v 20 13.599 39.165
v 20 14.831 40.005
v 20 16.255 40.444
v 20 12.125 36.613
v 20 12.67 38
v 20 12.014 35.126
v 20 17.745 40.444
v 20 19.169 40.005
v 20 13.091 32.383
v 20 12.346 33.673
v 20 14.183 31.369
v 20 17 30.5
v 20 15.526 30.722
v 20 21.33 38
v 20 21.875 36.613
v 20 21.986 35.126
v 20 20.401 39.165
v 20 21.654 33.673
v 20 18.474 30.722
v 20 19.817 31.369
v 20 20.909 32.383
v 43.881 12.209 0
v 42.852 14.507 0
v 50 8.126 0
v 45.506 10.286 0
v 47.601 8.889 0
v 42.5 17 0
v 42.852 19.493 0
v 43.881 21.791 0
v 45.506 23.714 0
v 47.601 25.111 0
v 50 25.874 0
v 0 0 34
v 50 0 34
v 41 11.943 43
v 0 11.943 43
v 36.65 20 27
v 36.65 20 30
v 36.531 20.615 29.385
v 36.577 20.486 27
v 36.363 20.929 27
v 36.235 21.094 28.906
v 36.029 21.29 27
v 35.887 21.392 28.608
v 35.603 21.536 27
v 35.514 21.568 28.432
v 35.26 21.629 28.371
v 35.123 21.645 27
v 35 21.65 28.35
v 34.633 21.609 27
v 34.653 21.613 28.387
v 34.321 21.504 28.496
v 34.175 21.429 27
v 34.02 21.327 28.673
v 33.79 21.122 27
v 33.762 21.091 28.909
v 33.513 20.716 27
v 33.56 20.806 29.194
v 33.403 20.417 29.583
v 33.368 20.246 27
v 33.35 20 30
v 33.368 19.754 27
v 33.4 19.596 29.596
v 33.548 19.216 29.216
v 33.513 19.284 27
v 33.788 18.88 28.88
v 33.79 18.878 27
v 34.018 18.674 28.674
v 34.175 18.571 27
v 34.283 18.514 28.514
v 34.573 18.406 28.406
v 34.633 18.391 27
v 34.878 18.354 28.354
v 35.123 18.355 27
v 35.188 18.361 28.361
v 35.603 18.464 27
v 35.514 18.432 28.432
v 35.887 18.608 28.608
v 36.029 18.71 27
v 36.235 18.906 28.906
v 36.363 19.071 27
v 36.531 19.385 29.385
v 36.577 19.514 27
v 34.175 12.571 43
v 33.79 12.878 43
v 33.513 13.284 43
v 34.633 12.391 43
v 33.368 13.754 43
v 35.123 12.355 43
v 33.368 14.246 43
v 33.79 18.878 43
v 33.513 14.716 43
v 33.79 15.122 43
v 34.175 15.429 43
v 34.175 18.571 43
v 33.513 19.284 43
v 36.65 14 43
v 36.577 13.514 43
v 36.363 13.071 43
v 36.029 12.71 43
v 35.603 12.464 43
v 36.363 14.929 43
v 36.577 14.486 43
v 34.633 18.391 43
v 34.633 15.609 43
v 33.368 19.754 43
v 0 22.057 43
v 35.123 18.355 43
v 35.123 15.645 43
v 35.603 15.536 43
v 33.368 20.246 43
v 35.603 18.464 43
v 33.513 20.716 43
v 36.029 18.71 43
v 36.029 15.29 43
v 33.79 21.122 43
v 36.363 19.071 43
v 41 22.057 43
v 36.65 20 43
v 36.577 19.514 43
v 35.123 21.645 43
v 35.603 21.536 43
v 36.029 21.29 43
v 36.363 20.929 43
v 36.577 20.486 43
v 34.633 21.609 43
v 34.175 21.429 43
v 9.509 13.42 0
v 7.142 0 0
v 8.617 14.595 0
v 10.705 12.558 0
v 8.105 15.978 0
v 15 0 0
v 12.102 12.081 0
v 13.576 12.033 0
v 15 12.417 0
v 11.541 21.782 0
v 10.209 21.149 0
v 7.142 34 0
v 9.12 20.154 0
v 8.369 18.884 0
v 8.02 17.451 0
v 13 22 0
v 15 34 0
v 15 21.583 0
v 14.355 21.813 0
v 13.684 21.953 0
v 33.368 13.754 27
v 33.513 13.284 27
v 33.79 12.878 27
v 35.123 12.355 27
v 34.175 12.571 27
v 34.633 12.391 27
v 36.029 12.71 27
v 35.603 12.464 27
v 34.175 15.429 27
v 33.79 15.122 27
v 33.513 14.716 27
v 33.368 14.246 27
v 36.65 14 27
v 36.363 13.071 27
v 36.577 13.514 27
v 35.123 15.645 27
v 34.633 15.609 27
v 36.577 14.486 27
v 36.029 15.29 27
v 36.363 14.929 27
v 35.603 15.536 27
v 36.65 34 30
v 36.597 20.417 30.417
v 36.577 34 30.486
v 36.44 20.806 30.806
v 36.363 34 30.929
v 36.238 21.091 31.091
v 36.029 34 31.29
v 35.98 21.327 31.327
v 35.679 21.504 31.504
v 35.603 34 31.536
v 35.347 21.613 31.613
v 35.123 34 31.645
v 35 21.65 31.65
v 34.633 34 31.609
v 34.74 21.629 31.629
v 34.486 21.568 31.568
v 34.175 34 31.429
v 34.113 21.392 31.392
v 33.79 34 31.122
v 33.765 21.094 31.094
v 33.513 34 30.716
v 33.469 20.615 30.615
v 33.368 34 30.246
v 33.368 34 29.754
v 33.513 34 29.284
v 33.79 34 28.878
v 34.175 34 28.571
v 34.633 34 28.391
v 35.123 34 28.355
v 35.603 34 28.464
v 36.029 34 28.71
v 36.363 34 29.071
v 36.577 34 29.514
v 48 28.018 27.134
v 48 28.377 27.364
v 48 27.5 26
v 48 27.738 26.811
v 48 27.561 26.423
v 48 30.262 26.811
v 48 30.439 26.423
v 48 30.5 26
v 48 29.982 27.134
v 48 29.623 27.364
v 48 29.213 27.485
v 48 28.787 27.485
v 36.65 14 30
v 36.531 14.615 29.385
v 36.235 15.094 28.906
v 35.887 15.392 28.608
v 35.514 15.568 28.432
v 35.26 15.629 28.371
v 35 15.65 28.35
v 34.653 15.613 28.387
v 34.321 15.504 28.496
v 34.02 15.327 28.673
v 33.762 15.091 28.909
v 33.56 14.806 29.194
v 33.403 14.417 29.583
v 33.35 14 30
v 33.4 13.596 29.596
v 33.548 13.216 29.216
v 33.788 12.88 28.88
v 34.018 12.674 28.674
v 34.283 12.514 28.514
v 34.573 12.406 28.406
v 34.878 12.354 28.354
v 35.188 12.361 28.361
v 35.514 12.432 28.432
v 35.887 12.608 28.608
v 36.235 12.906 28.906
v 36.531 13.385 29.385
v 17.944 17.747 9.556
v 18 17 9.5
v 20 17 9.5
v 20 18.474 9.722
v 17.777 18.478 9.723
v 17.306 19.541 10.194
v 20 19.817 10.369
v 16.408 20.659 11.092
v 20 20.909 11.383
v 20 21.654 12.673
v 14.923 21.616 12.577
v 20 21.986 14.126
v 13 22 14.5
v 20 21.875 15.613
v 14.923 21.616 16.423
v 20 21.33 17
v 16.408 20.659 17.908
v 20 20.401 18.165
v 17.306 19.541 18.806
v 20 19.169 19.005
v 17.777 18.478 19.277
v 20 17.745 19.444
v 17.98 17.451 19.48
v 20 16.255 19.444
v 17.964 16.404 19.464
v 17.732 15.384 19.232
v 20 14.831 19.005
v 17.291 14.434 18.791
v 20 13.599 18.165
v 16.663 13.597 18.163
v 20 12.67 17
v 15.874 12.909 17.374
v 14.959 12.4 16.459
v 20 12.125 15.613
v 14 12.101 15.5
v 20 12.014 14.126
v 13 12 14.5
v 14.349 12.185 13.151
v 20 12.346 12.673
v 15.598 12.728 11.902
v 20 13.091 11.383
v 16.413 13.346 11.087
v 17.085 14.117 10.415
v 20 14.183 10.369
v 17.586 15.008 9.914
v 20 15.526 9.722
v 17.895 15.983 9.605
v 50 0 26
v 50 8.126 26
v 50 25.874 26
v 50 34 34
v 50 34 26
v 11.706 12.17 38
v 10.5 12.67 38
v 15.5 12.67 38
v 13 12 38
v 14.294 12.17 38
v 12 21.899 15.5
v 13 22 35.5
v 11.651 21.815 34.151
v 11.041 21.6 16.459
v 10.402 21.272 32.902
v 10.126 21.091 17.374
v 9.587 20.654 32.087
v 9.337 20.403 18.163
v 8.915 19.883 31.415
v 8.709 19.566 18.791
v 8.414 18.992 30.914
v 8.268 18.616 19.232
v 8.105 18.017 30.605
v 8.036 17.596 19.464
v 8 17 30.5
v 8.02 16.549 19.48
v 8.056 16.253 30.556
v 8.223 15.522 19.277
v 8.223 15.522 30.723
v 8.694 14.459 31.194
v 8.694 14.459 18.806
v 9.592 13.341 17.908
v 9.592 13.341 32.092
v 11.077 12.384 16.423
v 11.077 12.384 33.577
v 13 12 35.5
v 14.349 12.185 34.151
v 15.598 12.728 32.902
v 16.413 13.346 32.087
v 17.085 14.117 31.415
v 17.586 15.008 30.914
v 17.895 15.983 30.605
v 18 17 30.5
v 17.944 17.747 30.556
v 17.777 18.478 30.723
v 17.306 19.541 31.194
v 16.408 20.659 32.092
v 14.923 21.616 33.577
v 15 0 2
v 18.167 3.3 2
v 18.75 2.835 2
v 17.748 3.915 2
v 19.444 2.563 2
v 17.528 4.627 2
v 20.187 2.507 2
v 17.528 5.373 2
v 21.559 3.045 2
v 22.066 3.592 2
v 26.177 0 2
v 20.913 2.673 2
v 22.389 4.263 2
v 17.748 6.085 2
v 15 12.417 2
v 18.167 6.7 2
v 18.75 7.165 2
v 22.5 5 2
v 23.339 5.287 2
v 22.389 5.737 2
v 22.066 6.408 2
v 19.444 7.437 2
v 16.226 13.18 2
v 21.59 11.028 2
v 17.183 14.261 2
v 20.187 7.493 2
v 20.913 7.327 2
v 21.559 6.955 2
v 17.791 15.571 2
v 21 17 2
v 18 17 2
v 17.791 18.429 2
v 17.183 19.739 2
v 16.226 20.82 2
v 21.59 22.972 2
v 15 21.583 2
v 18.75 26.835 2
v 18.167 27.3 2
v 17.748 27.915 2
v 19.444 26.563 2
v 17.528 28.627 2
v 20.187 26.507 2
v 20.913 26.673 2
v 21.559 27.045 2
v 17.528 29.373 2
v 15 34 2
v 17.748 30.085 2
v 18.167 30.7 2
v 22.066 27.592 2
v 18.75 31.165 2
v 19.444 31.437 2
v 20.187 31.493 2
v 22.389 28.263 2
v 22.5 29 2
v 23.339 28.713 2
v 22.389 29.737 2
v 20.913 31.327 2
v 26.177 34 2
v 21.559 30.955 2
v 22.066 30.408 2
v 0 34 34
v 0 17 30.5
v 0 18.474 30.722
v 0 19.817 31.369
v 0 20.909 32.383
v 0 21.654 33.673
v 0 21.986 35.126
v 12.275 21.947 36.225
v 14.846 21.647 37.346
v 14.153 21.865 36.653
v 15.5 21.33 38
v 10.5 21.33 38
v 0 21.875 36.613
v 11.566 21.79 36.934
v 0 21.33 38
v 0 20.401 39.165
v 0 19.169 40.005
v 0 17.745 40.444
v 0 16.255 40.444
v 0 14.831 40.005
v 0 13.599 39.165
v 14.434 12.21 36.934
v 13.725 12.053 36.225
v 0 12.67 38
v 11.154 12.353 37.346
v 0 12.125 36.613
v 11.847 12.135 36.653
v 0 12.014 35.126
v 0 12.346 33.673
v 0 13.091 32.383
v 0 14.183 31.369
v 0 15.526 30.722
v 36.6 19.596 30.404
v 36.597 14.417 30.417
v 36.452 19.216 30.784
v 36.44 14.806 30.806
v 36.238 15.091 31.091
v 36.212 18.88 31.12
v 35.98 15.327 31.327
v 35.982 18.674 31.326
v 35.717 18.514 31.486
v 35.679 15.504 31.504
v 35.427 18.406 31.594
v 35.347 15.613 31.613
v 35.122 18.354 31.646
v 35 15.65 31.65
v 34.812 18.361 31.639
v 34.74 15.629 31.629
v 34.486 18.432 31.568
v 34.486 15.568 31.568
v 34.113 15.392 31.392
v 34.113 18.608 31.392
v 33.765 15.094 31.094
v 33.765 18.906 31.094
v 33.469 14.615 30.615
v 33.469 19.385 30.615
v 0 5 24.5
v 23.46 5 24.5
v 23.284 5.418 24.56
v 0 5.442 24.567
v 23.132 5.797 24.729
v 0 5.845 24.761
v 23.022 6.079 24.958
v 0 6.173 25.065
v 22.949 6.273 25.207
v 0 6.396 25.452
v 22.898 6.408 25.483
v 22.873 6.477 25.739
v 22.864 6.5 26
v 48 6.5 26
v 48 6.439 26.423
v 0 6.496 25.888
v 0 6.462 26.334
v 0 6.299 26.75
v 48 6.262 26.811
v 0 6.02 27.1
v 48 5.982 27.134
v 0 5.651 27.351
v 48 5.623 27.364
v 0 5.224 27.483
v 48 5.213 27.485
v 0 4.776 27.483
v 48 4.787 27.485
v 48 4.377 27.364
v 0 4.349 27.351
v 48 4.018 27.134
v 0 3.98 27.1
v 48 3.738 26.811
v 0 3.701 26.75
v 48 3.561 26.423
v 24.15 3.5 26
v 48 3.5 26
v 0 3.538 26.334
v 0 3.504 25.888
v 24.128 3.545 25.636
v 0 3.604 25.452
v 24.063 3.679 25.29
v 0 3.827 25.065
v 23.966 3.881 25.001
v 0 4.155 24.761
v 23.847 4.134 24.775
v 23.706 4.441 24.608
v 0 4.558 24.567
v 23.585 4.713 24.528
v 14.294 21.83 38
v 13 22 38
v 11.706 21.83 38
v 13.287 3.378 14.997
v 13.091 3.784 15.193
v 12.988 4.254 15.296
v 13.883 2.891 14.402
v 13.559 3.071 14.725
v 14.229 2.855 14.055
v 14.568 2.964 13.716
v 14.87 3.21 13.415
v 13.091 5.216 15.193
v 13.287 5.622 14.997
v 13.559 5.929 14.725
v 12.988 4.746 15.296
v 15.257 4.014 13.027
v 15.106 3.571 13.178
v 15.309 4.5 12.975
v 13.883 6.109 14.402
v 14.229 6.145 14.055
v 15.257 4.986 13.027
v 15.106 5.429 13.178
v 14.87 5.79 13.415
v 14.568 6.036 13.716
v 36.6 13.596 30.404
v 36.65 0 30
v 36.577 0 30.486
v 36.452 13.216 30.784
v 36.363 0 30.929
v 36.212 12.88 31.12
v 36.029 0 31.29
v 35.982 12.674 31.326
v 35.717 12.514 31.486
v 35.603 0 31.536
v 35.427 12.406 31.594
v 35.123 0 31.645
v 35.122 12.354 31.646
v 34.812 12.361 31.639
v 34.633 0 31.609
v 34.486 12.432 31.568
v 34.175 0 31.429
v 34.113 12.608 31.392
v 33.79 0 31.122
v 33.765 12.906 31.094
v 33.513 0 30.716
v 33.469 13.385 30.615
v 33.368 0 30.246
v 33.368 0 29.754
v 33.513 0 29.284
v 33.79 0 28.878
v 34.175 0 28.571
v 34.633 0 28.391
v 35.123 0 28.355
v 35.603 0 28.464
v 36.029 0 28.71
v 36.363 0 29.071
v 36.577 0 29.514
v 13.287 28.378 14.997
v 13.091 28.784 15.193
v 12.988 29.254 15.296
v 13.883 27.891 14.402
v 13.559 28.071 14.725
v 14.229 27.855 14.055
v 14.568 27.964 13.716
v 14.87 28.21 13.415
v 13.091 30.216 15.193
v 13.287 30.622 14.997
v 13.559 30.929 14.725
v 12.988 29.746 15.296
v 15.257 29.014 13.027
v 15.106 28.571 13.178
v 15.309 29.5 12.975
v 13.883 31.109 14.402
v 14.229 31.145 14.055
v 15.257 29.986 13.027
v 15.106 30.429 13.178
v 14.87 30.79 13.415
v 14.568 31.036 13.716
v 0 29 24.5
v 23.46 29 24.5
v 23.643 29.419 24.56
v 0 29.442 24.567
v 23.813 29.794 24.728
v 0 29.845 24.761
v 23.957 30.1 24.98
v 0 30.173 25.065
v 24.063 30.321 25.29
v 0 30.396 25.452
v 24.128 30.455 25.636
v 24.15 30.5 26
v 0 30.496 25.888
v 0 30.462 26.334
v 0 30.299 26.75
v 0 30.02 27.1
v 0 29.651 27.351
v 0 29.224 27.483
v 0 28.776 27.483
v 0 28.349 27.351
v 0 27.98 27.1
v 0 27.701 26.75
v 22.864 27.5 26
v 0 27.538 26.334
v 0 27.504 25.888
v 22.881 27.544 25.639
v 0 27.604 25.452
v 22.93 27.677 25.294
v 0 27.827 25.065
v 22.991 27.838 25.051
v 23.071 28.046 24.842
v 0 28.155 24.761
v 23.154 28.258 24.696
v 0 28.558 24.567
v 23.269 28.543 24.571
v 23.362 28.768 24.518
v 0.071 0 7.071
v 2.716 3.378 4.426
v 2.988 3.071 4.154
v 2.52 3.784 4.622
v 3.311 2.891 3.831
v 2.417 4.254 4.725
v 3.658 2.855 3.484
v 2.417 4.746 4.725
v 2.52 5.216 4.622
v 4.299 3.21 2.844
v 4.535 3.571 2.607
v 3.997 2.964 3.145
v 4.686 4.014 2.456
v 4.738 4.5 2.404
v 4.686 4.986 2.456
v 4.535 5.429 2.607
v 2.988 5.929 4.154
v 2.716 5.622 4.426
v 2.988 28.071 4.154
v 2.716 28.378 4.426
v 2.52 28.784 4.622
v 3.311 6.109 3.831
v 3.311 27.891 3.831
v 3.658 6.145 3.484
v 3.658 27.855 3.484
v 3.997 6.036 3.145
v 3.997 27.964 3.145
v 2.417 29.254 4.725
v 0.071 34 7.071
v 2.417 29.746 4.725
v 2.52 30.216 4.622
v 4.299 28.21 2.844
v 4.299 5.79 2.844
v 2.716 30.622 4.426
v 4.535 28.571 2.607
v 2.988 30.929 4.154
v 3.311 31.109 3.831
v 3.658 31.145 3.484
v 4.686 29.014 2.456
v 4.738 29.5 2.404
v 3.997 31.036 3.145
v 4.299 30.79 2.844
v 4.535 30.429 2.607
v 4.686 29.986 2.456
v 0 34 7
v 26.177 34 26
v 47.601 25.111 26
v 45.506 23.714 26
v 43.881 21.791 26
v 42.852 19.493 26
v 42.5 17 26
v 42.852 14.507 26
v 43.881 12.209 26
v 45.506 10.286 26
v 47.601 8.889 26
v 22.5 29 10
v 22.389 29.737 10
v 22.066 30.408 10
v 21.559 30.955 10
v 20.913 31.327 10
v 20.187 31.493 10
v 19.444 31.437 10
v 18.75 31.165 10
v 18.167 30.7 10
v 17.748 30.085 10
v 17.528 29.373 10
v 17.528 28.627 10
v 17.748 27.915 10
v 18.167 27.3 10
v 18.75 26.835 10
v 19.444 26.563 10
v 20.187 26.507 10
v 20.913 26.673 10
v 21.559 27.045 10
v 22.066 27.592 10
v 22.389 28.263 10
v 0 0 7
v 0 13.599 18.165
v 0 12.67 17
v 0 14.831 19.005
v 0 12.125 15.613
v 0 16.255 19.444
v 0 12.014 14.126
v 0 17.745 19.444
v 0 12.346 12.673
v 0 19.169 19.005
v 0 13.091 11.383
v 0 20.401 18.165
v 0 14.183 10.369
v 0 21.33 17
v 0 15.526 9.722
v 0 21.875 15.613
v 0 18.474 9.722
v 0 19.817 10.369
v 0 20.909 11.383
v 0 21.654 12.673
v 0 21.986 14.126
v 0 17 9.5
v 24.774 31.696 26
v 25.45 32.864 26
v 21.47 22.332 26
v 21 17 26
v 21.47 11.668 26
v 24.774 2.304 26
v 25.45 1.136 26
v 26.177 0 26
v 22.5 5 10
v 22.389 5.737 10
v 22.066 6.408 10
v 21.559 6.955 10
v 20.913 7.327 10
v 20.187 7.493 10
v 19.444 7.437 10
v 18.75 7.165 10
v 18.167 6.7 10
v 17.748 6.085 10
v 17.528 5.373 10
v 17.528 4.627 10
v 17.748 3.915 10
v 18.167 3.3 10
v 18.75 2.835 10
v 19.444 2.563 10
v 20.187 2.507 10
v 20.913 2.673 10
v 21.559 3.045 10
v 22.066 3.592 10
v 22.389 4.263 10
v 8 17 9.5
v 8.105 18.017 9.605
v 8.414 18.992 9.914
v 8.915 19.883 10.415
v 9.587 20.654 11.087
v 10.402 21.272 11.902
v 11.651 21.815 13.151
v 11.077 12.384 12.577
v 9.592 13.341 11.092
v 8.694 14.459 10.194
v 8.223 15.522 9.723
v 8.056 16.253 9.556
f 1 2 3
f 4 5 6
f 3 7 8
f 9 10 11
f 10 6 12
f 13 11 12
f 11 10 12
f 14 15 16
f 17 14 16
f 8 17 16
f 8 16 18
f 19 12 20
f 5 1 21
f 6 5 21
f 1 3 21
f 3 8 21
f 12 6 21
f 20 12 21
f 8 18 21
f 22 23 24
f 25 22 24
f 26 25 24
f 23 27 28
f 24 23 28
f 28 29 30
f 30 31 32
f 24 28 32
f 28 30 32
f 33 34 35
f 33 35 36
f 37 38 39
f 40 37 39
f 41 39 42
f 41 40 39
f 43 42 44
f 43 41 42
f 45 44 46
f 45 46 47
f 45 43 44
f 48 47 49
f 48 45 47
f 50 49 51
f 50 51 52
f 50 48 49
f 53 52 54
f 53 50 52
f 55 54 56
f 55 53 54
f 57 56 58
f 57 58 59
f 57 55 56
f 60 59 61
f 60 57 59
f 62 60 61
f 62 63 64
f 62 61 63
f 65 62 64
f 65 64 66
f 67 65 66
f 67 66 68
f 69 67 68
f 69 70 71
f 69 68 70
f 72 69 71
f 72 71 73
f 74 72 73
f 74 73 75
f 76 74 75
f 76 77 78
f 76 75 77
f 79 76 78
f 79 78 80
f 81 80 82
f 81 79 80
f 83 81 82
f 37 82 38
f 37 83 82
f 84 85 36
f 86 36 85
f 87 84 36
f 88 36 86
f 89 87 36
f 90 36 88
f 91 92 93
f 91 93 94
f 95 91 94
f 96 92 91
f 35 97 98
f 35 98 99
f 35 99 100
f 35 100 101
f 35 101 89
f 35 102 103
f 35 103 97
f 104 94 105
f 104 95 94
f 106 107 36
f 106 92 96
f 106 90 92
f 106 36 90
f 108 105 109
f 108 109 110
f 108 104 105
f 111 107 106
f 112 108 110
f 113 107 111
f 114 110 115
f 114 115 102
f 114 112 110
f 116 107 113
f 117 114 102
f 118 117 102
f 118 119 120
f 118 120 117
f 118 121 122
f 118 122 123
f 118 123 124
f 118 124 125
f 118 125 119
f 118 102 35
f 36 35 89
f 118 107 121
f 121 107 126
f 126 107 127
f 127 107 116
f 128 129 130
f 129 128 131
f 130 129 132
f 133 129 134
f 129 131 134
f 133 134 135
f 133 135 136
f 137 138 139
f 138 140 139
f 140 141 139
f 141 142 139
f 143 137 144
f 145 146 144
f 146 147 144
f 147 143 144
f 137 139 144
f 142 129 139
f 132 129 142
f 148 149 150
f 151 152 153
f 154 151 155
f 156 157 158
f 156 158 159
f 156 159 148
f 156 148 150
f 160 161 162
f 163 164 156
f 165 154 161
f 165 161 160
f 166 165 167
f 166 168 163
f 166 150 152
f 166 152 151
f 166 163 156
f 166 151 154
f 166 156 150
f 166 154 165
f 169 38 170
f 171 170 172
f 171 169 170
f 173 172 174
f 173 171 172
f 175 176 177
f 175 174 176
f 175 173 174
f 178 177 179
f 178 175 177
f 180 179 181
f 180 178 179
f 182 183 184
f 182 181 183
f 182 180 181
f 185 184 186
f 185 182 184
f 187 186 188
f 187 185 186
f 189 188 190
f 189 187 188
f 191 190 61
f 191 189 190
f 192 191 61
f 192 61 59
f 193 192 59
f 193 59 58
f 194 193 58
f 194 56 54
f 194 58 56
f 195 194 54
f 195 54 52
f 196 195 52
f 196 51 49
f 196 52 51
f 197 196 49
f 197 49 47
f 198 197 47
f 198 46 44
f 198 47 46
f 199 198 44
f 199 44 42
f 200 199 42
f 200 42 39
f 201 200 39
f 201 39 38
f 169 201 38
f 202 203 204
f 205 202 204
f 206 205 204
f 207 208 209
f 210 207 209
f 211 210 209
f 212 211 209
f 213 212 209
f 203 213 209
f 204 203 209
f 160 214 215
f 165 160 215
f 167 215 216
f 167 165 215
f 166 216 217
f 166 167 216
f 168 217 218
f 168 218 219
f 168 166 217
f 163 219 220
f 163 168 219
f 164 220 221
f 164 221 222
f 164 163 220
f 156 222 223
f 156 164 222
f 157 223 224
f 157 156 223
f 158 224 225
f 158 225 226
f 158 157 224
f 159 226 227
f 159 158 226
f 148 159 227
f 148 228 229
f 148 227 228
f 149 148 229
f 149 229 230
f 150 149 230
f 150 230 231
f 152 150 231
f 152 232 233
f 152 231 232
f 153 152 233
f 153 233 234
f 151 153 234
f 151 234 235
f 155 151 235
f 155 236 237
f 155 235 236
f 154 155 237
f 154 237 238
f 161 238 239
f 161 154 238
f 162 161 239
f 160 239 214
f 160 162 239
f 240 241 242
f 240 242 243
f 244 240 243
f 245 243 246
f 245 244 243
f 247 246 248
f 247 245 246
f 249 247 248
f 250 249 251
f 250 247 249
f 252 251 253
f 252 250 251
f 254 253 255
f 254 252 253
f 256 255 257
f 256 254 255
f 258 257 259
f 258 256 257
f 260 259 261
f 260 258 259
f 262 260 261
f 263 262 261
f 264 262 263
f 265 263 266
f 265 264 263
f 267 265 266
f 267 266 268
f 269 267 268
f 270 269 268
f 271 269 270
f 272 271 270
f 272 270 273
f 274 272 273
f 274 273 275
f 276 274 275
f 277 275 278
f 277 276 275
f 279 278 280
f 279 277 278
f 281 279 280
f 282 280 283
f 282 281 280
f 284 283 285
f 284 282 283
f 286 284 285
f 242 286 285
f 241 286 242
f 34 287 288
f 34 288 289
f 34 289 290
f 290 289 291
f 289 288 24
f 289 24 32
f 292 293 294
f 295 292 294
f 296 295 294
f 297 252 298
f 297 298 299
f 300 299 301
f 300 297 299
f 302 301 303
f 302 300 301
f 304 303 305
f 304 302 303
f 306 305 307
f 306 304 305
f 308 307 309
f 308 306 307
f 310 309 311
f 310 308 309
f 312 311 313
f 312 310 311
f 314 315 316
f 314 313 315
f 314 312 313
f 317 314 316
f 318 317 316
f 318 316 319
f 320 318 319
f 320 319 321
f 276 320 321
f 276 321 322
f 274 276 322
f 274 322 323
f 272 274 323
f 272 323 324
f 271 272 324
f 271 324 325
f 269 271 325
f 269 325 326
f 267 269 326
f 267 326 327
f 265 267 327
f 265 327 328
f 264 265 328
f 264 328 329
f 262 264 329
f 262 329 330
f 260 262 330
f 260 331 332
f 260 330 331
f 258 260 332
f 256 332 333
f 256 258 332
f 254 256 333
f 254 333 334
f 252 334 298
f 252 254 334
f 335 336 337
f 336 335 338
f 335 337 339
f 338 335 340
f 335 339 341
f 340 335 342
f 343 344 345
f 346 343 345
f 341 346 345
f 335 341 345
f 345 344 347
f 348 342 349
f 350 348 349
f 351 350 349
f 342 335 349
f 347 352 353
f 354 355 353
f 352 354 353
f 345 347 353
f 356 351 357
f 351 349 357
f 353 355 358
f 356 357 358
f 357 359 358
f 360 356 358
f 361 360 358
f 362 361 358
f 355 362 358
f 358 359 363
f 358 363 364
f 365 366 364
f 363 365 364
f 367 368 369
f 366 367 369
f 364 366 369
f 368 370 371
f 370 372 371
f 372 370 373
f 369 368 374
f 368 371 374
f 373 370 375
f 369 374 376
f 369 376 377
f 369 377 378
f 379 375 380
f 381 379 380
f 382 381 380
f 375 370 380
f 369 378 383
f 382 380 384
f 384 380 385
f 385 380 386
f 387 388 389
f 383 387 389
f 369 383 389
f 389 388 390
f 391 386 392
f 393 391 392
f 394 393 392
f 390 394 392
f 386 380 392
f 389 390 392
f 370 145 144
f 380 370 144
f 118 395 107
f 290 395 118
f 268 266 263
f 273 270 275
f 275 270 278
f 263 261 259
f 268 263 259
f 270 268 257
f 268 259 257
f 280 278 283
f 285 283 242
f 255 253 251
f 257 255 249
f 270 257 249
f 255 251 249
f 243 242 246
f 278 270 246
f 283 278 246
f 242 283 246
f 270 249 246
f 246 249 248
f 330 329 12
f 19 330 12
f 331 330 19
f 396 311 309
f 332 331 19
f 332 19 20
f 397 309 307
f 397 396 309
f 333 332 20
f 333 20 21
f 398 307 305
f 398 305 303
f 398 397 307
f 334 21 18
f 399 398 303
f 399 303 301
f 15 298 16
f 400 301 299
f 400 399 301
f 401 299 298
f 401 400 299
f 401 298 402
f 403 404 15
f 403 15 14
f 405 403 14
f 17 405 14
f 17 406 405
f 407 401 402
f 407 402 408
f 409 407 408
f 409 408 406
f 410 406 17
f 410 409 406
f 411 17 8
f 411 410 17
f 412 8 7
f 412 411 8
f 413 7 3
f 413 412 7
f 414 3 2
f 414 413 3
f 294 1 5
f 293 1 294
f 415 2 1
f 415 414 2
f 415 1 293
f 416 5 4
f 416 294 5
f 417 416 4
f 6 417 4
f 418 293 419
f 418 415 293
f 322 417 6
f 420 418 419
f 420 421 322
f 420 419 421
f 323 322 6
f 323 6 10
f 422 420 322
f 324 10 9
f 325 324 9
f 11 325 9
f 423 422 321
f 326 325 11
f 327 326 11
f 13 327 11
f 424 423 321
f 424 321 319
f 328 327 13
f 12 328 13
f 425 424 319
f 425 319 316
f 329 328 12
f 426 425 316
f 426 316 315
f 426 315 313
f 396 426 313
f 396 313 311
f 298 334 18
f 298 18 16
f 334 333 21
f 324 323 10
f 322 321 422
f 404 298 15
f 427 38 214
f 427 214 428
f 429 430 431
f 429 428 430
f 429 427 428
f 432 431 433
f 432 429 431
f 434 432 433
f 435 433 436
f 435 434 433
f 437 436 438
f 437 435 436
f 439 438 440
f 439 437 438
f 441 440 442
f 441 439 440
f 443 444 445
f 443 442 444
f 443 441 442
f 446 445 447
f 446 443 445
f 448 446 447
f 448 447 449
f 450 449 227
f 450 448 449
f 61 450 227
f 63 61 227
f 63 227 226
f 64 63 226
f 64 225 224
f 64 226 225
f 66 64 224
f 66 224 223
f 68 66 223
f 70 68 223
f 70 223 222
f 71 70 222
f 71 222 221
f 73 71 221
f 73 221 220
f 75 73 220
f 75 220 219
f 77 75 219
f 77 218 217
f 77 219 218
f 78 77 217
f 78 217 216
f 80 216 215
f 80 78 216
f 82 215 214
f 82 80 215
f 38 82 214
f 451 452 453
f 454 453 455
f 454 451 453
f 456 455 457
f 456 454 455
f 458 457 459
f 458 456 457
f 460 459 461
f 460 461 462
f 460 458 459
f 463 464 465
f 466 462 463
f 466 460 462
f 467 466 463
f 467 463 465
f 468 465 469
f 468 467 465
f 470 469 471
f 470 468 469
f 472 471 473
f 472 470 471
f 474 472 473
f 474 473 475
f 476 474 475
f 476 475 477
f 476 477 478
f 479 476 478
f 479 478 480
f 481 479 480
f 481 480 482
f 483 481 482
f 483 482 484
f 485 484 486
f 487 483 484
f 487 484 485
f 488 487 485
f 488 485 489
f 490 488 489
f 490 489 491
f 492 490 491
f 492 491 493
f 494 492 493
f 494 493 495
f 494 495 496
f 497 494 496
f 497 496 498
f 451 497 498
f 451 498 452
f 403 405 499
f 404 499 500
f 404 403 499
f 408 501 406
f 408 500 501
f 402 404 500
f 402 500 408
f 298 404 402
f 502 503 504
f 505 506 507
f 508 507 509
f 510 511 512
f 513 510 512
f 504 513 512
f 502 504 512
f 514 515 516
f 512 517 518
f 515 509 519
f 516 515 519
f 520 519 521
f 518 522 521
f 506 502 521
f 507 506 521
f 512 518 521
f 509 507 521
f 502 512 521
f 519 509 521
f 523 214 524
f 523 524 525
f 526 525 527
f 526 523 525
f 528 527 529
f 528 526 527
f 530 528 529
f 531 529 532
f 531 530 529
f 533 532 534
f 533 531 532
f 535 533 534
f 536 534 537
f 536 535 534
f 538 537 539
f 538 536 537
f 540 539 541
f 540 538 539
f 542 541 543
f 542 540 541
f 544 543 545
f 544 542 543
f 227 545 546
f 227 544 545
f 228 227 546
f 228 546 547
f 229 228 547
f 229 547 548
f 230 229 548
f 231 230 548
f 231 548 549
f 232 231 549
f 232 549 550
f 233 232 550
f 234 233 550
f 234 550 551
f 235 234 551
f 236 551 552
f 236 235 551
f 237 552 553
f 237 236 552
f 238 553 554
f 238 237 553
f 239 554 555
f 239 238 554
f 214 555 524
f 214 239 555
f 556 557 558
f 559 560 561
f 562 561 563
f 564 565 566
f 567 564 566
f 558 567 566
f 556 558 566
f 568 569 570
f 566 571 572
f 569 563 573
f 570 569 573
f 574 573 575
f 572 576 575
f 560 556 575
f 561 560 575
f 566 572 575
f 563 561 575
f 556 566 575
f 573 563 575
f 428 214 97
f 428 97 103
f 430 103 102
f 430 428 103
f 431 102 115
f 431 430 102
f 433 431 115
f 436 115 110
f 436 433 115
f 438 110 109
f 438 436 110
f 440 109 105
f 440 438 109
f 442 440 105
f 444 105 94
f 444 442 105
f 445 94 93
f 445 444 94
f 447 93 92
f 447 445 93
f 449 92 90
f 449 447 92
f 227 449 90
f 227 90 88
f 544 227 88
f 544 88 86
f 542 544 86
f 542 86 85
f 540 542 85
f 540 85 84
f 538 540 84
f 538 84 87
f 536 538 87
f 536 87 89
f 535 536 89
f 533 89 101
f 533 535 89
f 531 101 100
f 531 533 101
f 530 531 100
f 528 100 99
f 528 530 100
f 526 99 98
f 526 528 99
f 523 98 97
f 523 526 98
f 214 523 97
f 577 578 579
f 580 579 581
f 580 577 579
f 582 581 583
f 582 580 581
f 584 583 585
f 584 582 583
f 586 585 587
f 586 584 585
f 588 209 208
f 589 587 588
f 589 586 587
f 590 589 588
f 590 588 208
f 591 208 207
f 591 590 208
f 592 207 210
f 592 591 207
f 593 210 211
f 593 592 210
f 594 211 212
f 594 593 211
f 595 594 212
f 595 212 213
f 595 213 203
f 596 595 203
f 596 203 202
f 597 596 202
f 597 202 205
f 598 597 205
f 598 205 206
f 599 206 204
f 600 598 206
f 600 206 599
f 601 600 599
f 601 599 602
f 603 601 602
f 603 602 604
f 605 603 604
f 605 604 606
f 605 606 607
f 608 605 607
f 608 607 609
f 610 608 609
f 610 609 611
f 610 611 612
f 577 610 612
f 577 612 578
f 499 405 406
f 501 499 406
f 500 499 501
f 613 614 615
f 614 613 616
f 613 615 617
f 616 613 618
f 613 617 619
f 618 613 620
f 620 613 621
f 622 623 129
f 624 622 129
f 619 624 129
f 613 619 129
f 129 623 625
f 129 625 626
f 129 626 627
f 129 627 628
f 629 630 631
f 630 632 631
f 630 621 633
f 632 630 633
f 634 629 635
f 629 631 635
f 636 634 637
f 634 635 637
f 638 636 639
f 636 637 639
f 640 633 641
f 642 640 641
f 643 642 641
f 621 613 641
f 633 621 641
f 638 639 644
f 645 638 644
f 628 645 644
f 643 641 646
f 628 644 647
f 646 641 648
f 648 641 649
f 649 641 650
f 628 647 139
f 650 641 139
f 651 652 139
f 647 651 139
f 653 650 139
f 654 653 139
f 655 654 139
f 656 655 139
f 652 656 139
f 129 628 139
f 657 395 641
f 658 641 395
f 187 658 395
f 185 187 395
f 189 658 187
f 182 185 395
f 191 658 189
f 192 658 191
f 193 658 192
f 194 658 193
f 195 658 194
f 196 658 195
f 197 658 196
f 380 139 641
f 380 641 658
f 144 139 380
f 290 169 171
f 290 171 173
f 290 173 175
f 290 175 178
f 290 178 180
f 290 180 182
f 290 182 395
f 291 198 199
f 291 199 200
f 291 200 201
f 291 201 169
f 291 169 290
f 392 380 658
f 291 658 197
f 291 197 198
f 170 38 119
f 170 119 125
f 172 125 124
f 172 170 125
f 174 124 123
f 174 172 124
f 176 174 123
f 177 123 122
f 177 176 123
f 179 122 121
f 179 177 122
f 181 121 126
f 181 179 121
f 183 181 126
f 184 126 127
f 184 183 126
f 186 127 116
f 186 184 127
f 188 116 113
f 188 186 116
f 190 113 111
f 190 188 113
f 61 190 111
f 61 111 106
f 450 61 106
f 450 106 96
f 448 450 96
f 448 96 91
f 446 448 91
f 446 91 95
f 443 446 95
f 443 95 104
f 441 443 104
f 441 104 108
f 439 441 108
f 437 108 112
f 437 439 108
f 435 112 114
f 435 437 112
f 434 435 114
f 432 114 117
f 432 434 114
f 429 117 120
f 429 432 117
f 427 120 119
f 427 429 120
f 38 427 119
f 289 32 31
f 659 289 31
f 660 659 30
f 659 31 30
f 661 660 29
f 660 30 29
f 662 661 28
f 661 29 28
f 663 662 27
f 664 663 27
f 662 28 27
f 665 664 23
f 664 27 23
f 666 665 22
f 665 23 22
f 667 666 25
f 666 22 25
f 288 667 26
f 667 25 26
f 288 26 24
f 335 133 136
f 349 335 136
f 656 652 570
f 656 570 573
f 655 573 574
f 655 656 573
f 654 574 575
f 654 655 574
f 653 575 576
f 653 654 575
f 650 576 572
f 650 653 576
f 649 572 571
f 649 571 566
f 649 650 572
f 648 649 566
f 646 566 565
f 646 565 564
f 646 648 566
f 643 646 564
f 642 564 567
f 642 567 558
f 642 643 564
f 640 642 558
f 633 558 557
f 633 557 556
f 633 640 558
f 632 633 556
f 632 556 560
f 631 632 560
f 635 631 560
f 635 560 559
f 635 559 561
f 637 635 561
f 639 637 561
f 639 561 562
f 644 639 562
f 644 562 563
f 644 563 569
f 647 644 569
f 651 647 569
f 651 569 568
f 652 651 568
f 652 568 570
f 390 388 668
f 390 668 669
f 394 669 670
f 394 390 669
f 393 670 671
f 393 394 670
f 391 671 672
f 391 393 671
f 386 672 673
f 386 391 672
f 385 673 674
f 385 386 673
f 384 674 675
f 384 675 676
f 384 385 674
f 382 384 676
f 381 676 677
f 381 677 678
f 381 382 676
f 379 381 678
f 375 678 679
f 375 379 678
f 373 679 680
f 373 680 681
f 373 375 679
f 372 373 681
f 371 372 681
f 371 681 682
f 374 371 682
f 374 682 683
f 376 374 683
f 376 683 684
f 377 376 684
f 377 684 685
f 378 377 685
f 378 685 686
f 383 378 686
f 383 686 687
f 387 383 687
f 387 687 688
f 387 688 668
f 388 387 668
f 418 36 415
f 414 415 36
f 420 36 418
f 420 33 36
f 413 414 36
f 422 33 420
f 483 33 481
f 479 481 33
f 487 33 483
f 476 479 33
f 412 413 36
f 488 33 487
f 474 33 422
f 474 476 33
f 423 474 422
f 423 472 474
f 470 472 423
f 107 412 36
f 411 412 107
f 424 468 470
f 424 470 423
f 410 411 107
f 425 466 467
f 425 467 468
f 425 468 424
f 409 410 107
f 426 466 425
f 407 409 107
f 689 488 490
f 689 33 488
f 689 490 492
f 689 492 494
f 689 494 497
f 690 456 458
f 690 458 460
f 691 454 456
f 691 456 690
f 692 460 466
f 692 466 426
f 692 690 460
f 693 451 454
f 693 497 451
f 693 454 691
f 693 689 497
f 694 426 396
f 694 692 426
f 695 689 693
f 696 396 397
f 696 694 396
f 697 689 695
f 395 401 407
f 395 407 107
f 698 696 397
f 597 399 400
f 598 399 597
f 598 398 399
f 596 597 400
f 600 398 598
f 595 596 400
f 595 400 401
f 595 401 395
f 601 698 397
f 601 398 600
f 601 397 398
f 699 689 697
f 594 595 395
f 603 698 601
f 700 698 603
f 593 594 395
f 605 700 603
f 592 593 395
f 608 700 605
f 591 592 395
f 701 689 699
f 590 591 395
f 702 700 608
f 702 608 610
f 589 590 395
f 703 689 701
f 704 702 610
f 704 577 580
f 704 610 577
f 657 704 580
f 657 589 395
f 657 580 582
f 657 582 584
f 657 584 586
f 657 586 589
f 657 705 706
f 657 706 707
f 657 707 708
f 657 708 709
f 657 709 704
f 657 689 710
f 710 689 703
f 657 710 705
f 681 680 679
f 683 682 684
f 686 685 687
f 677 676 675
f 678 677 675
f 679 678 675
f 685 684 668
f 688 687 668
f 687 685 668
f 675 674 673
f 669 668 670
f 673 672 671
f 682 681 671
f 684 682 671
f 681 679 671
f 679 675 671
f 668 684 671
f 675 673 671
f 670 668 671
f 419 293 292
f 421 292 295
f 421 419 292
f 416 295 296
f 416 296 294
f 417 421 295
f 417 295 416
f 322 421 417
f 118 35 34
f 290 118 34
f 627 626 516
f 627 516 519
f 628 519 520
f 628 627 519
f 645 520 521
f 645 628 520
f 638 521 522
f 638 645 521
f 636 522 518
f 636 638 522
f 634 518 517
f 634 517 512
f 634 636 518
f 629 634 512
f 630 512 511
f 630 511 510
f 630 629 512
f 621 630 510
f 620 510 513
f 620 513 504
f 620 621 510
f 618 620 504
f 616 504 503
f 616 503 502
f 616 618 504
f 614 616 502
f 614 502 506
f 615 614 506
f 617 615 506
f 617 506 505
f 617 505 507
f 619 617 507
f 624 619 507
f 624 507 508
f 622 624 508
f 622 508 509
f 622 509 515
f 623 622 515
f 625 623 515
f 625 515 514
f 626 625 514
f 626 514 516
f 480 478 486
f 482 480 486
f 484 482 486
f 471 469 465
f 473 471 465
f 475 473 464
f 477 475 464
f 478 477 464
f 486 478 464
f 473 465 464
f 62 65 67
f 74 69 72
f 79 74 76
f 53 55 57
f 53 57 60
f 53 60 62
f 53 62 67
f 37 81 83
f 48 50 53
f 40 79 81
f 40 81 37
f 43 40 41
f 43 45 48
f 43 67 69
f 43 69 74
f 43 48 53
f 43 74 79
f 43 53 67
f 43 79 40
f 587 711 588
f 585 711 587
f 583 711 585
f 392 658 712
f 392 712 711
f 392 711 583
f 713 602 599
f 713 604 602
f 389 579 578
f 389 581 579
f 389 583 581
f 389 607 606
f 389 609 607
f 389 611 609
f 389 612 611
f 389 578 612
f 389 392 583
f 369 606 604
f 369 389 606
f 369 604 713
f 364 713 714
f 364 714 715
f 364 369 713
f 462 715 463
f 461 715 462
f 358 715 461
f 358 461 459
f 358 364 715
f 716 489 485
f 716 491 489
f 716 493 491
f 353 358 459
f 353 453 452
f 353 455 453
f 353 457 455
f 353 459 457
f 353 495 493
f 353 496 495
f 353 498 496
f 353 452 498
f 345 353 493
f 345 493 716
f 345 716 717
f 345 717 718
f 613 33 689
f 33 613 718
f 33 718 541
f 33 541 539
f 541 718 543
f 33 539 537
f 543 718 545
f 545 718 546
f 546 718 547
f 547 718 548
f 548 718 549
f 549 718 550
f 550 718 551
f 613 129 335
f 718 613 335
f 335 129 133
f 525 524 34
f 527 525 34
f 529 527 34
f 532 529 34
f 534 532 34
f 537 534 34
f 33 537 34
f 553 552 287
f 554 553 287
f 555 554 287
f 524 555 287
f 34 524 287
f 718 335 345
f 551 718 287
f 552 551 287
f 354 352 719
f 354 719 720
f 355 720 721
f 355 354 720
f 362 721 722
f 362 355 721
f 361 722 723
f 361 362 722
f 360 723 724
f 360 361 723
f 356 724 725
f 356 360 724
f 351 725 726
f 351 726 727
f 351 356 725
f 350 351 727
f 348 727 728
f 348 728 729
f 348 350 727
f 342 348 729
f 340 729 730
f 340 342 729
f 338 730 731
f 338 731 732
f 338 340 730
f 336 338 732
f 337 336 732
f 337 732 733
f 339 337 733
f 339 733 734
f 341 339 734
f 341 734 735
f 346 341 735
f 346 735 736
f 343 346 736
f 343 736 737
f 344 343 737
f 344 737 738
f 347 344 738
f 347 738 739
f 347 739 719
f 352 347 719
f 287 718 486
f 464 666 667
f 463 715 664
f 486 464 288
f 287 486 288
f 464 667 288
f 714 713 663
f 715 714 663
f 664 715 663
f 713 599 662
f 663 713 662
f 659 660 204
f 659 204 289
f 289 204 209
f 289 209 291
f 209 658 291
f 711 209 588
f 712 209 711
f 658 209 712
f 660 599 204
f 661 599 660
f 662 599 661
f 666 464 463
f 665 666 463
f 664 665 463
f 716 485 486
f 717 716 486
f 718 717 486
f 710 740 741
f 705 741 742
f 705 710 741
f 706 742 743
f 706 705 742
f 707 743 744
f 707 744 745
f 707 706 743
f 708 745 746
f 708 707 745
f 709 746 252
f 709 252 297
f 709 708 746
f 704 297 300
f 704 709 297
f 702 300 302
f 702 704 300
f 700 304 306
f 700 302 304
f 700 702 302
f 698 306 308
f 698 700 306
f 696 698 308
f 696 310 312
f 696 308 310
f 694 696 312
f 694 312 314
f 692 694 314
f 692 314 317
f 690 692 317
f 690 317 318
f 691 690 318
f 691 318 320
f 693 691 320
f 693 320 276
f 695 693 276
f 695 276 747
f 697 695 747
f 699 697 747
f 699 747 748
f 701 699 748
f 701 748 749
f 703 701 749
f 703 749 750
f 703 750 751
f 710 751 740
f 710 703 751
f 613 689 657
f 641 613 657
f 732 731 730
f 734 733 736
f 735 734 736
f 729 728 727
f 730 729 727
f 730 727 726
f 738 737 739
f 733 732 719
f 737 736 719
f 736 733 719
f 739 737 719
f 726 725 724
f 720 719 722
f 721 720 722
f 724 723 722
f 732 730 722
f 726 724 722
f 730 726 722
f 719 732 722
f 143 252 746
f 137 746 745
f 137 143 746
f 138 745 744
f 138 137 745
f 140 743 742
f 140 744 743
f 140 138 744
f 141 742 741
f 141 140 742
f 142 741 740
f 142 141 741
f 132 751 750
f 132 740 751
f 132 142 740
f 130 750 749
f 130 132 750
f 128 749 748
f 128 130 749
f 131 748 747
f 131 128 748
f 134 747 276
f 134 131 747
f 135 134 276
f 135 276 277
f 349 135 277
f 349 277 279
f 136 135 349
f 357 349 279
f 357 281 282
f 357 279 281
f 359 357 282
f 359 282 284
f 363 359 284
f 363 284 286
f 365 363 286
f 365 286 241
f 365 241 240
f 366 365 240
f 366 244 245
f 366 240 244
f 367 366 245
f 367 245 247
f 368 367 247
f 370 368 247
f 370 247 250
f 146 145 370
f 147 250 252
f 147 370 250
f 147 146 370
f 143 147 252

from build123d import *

# Parameters (mm, degrees)
CYLINDER023_R               = 1.5
CYLINDER023_DEPTH           = 48
CYLINDER022_R               = 1.5
CYLINDER022_DEPTH           = 48
CYLINDER021_R               = 1.65
CYLINDER021_DEPTH           = 20
CYLINDER021_PLACEMENT_ANGLE = 45
CYLINDER020_R               = 1.65
CYLINDER020_DEPTH           = 20
CYLINDER020_PLACEMENT_ANGLE = 45
BOX008_W                    = 10
BOX008_H                    = 34
BOX008_DEPTH                = 10
BOX008_PLACEMENT_ANGLE      = 45
CYLINDER018_R               = 5
CYLINDER018_DEPTH           = 20
CYLINDER019_R               = 5
CYLINDER019_DEPTH           = 20
CYLINDER017_R               = 5
CYLINDER017_DEPTH           = 38
BOX006_W                    = 15
BOX006_H                    = 34
BOX006_DEPTH                = 2
CYLINDER011_R               = 2.5
CYLINDER011_DEPTH           = 10
CYLINDER012_R               = 2.5
CYLINDER012_DEPTH           = 10
CYLINDER009_R               = 1.65
CYLINDER009_DEPTH           = 34
CYLINDER010_R               = 1.65
CYLINDER010_DEPTH           = 34
CYLINDER008_R               = 1.65
CYLINDER008_DEPTH           = 34
CYLINDER001_R               = 9
CYLINDER001_DEPTH           = 26
CYLINDER_R                  = 30.5
CYLINDER_DEPTH              = 26
BOX002_W                    = 72
BOX002_H                    = 20
BOX002_DEPTH                = 50
BOX002_PLACEMENT_ANGLE      = 53
BOX003_W                    = 72
BOX003_H                    = 20
BOX003_DEPTH                = 50
BOX003_PLACEMENT_ANGLE      = 53
COMPOUND_PLACEMENT_ANGLE    = 180
BOX001_W                    = 100
BOX001_H                    = 34
BOX001_DEPTH                = 50
BOX001_PLACEMENT_ANGLE      = 45
BOX_W                       = 50
BOX_H                       = 34
BOX_DEPTH                   = 43


with BuildPart() as cylinder023:
    # Cylinder023 → Cylinder023 (new body)
    with BuildSketch(Plane(origin=(0, 29, 26), x_dir=(0, 0, -1), z_dir=(1, 0, 0))):
        Circle(CYLINDER023_R)
    extrude(amount=CYLINDER023_DEPTH)


with BuildPart() as cabledrillhole:
    # Cylinder022 → Cylinder022 (new body)
    with BuildSketch(Plane(origin=(0, 5, 26), x_dir=(0, 0, -1), z_dir=(1, 0, 0))):
        Circle(CYLINDER022_R)
    extrude(amount=CYLINDER022_DEPTH)

    # Fusion008: union Cylinder023
    add(cylinder023.part)


with BuildPart() as cylinder021:
    # Cylinder021 → Cylinder021 (new body)
    with BuildSketch(Plane.XY):
        Circle(CYLINDER021_R)
    extrude(amount=CYLINDER021_DEPTH)


with BuildPart() as cylinder021_1:
    # Cylinder021 placement: moved
    add(cylinder021.part.moved(Location((0, 29.5, 0))).rotate(Axis((0, 29.5, 0), (0, 1, 0)), CYLINDER021_PLACEMENT_ANGLE))


with BuildPart() as m4screws:
    # Cylinder020 → Cylinder020 (new body)
    with BuildSketch(Plane.XY):
        Circle(CYLINDER020_R)
    extrude(amount=CYLINDER020_DEPTH)


with BuildPart() as m4screws_1:
    # Cylinder020 placement: moved
    add(m4screws.part.moved(Location((0, 4.5, 0))).rotate(Axis((0, 4.5, 0), (0, 1, 0)), CYLINDER020_PLACEMENT_ANGLE))

    # Fusion007: union Cylinder021
    add(cylinder021_1.part)


with BuildPart() as cube008:
    # Box008 → Box008 (new body)
    with BuildSketch(Plane.XY):
        with Locations((5, 17)):
            Rectangle(BOX008_W, BOX008_H)
    extrude(amount=BOX008_DEPTH)


with BuildPart() as cube008_1:
    # Box008 placement: moved
    add(cube008.part.moved(Location((-7, 0, 0))).rotate(Axis((-7, 0, 0), (0, 1, 0)), BOX008_PLACEMENT_ANGLE))


with BuildPart() as nitrogenchamber002:
    # Cylinder018 → Cylinder018 (new body)
    with BuildSketch(Plane(origin=(0, 17, 14.5), x_dir=(0, 0, -1), z_dir=(1, 0, 0))):
        Circle(CYLINDER018_R)
    extrude(amount=CYLINDER018_DEPTH)


with BuildPart() as nitrogenchamber003:
    # Cylinder019 → Cylinder019 (new body)
    with BuildSketch(Plane(origin=(0, 17, 35.5), x_dir=(0, 0, -1), z_dir=(1, 0, 0))):
        Circle(CYLINDER019_R)
    extrude(amount=CYLINDER019_DEPTH)


with BuildPart() as nitrogenchamber:
    # Cylinder017 → Cylinder017 (new body)
    with BuildSketch(Plane(origin=(13, 17, 0), x_dir=(0, 1, 0), z_dir=(0, 0, 1))):
        Circle(CYLINDER017_R)
    extrude(amount=CYLINDER017_DEPTH)

    # Fusion006: union NitrogenChamber002, NitrogenChamber003
    add(nitrogenchamber002.part)
    add(nitrogenchamber003.part)


with BuildPart() as cube006:
    # Box006 → Box006 (new body)
    with BuildSketch(Plane(origin=(15, 0, 0), x_dir=(1, 0, 0), z_dir=(0, 0, 1))):
        with Locations((7.5, 17)):
            Rectangle(BOX006_W, BOX006_H)
    extrude(amount=BOX006_DEPTH)


with BuildPart() as cylinder011:
    # Cylinder011 → Cylinder011 (new body)
    with BuildSketch(Plane(origin=(20, 5, 0), x_dir=(1, 0, 0), z_dir=(0, 0, 1))):
        Circle(CYLINDER011_R)
    extrude(amount=CYLINDER011_DEPTH)


with BuildPart() as boreholem6screws01:
    # Cylinder012 → Cylinder012 (new body)
    with BuildSketch(Plane(origin=(20, 29, 0), x_dir=(1, 0, 0), z_dir=(0, 0, 1))):
        Circle(CYLINDER012_R)
    extrude(amount=CYLINDER012_DEPTH)

    # Fusion002: union Cylinder011
    add(cylinder011.part)


with BuildPart() as cylinder009:
    # Cylinder009 → Cylinder009 (new body)
    with BuildSketch(Plane(origin=(35, 20, 27), x_dir=(1, 0, 0), z_dir=(0, 0, 1))):
        Circle(CYLINDER009_R)
    extrude(amount=CYLINDER009_DEPTH)


with BuildPart() as cylinder010:
    # Cylinder010 → Cylinder010 (new body)
    with BuildSketch(Plane(origin=(35, 14, 27), x_dir=(1, 0, 0), z_dir=(0, 0, 1))):
        Circle(CYLINDER010_R)
    extrude(amount=CYLINDER010_DEPTH)


with BuildPart() as m4mountscrews01_corehole:
    # Cylinder008 → Cylinder008 (new body)
    with BuildSketch(Plane(origin=(35, 34, 30), x_dir=(1, 0, 0), z_dir=(0, -1, 0))):
        Circle(CYLINDER008_R)
    extrude(amount=CYLINDER008_DEPTH)

    # Fusion001: union Cylinder009, Cylinder010
    add(cylinder009.part)
    add(cylinder010.part)


with BuildPart() as cylinder001:
    # Cylinder001 → Cylinder001 (new body)
    with BuildSketch(Plane.XY):
        Circle(CYLINDER001_R)
    extrude(amount=CYLINDER001_DEPTH)


with BuildPart() as cut001:
    # Cylinder → Cylinder (new body)
    with BuildSketch(Plane.XY):
        Circle(CYLINDER_R)
    extrude(amount=CYLINDER_DEPTH)

    # Cut001: cut Cylinder001
    add(cylinder001.part, mode=Mode.SUBTRACT)


with BuildPart() as cut001_1:
    # Cut001 placement: moved
    add(cut001.part.moved(Location((51.5, 17, 0))))


with BuildPart() as cube002:
    # Box002 → Box002 (new body)
    with BuildSketch(Plane.XY):
        with Locations((36, 10)):
            Rectangle(BOX002_W, BOX002_H)
    extrude(amount=BOX002_DEPTH)


with BuildPart() as cube002_1:
    # Box002 placement: moved
    add(cube002.part.moved(Location((0, 34, 34))).rotate(Axis((0, 34, 34), (1, 0, 0)), BOX002_PLACEMENT_ANGLE))


with BuildPart() as compound:
    # Box003 → Box003 (new body)
    with BuildSketch(Plane.XY):
        with Locations((36, 10)):
            Rectangle(BOX003_W, BOX003_H)
    extrude(amount=BOX003_DEPTH)


with BuildPart() as compound_1:
    # Box003 placement: moved
    add(compound.part.moved(Location((0, 34, 34))).rotate(Axis((0, 34, 34), (1, 0, 0)), BOX003_PLACEMENT_ANGLE))


with BuildPart() as compound_2:
    # Compound placement: moved
    add(compound_1.part.moved(Location((72, 34, 0))).rotate(Axis((72, 34, 0), (0, 0, 1)), COMPOUND_PLACEMENT_ANGLE))


with BuildPart() as fusion:
    # Box001 → Box001 (new body)
    with BuildSketch(Plane.XY):
        with Locations((50, 17)):
            Rectangle(BOX001_W, BOX001_H)
    extrude(amount=BOX001_DEPTH)


with BuildPart() as fusion_1:
    # Box001 placement: moved
    add(fusion.part.moved(Location((41, 0, 43))).rotate(Axis((41, 0, 43), (0, 1, 0)), BOX001_PLACEMENT_ANGLE))

    # Fusion: union Cube002, Compound
    add(cube002_1.part)
    add(compound_2.part)


with BuildPart() as cryostage:
    # Box → Box (new body)
    with BuildSketch(Plane.XY):
        with Locations((25, 17)):
            Rectangle(BOX_W, BOX_H)
    extrude(amount=BOX_DEPTH)

    # Cut: cut Fusion
    add(fusion_1.part, mode=Mode.SUBTRACT)

    # Cut003: cut Cut001
    add(cut001_1.part, mode=Mode.SUBTRACT)

    # Cut008: cut M4Mountscrews01_Corehole
    add(m4mountscrews01_corehole.part, mode=Mode.SUBTRACT)

    # Cut009: cut BoreholeM6Screws01
    add(boreholem6screws01.part, mode=Mode.SUBTRACT)

    # Cut011: cut Cube006
    add(cube006.part, mode=Mode.SUBTRACT)

    # Cut014: cut NitrogenChamber
    add(nitrogenchamber.part, mode=Mode.SUBTRACT)

    # Cut015: cut Cube008
    add(cube008_1.part, mode=Mode.SUBTRACT)

    # Cut016: cut M4Screws
    add(m4screws_1.part, mode=Mode.SUBTRACT)

    # Cut017: cut CableDrillHole
    add(cabledrillhole.part, mode=Mode.SUBTRACT)


solid = cryostage.part
